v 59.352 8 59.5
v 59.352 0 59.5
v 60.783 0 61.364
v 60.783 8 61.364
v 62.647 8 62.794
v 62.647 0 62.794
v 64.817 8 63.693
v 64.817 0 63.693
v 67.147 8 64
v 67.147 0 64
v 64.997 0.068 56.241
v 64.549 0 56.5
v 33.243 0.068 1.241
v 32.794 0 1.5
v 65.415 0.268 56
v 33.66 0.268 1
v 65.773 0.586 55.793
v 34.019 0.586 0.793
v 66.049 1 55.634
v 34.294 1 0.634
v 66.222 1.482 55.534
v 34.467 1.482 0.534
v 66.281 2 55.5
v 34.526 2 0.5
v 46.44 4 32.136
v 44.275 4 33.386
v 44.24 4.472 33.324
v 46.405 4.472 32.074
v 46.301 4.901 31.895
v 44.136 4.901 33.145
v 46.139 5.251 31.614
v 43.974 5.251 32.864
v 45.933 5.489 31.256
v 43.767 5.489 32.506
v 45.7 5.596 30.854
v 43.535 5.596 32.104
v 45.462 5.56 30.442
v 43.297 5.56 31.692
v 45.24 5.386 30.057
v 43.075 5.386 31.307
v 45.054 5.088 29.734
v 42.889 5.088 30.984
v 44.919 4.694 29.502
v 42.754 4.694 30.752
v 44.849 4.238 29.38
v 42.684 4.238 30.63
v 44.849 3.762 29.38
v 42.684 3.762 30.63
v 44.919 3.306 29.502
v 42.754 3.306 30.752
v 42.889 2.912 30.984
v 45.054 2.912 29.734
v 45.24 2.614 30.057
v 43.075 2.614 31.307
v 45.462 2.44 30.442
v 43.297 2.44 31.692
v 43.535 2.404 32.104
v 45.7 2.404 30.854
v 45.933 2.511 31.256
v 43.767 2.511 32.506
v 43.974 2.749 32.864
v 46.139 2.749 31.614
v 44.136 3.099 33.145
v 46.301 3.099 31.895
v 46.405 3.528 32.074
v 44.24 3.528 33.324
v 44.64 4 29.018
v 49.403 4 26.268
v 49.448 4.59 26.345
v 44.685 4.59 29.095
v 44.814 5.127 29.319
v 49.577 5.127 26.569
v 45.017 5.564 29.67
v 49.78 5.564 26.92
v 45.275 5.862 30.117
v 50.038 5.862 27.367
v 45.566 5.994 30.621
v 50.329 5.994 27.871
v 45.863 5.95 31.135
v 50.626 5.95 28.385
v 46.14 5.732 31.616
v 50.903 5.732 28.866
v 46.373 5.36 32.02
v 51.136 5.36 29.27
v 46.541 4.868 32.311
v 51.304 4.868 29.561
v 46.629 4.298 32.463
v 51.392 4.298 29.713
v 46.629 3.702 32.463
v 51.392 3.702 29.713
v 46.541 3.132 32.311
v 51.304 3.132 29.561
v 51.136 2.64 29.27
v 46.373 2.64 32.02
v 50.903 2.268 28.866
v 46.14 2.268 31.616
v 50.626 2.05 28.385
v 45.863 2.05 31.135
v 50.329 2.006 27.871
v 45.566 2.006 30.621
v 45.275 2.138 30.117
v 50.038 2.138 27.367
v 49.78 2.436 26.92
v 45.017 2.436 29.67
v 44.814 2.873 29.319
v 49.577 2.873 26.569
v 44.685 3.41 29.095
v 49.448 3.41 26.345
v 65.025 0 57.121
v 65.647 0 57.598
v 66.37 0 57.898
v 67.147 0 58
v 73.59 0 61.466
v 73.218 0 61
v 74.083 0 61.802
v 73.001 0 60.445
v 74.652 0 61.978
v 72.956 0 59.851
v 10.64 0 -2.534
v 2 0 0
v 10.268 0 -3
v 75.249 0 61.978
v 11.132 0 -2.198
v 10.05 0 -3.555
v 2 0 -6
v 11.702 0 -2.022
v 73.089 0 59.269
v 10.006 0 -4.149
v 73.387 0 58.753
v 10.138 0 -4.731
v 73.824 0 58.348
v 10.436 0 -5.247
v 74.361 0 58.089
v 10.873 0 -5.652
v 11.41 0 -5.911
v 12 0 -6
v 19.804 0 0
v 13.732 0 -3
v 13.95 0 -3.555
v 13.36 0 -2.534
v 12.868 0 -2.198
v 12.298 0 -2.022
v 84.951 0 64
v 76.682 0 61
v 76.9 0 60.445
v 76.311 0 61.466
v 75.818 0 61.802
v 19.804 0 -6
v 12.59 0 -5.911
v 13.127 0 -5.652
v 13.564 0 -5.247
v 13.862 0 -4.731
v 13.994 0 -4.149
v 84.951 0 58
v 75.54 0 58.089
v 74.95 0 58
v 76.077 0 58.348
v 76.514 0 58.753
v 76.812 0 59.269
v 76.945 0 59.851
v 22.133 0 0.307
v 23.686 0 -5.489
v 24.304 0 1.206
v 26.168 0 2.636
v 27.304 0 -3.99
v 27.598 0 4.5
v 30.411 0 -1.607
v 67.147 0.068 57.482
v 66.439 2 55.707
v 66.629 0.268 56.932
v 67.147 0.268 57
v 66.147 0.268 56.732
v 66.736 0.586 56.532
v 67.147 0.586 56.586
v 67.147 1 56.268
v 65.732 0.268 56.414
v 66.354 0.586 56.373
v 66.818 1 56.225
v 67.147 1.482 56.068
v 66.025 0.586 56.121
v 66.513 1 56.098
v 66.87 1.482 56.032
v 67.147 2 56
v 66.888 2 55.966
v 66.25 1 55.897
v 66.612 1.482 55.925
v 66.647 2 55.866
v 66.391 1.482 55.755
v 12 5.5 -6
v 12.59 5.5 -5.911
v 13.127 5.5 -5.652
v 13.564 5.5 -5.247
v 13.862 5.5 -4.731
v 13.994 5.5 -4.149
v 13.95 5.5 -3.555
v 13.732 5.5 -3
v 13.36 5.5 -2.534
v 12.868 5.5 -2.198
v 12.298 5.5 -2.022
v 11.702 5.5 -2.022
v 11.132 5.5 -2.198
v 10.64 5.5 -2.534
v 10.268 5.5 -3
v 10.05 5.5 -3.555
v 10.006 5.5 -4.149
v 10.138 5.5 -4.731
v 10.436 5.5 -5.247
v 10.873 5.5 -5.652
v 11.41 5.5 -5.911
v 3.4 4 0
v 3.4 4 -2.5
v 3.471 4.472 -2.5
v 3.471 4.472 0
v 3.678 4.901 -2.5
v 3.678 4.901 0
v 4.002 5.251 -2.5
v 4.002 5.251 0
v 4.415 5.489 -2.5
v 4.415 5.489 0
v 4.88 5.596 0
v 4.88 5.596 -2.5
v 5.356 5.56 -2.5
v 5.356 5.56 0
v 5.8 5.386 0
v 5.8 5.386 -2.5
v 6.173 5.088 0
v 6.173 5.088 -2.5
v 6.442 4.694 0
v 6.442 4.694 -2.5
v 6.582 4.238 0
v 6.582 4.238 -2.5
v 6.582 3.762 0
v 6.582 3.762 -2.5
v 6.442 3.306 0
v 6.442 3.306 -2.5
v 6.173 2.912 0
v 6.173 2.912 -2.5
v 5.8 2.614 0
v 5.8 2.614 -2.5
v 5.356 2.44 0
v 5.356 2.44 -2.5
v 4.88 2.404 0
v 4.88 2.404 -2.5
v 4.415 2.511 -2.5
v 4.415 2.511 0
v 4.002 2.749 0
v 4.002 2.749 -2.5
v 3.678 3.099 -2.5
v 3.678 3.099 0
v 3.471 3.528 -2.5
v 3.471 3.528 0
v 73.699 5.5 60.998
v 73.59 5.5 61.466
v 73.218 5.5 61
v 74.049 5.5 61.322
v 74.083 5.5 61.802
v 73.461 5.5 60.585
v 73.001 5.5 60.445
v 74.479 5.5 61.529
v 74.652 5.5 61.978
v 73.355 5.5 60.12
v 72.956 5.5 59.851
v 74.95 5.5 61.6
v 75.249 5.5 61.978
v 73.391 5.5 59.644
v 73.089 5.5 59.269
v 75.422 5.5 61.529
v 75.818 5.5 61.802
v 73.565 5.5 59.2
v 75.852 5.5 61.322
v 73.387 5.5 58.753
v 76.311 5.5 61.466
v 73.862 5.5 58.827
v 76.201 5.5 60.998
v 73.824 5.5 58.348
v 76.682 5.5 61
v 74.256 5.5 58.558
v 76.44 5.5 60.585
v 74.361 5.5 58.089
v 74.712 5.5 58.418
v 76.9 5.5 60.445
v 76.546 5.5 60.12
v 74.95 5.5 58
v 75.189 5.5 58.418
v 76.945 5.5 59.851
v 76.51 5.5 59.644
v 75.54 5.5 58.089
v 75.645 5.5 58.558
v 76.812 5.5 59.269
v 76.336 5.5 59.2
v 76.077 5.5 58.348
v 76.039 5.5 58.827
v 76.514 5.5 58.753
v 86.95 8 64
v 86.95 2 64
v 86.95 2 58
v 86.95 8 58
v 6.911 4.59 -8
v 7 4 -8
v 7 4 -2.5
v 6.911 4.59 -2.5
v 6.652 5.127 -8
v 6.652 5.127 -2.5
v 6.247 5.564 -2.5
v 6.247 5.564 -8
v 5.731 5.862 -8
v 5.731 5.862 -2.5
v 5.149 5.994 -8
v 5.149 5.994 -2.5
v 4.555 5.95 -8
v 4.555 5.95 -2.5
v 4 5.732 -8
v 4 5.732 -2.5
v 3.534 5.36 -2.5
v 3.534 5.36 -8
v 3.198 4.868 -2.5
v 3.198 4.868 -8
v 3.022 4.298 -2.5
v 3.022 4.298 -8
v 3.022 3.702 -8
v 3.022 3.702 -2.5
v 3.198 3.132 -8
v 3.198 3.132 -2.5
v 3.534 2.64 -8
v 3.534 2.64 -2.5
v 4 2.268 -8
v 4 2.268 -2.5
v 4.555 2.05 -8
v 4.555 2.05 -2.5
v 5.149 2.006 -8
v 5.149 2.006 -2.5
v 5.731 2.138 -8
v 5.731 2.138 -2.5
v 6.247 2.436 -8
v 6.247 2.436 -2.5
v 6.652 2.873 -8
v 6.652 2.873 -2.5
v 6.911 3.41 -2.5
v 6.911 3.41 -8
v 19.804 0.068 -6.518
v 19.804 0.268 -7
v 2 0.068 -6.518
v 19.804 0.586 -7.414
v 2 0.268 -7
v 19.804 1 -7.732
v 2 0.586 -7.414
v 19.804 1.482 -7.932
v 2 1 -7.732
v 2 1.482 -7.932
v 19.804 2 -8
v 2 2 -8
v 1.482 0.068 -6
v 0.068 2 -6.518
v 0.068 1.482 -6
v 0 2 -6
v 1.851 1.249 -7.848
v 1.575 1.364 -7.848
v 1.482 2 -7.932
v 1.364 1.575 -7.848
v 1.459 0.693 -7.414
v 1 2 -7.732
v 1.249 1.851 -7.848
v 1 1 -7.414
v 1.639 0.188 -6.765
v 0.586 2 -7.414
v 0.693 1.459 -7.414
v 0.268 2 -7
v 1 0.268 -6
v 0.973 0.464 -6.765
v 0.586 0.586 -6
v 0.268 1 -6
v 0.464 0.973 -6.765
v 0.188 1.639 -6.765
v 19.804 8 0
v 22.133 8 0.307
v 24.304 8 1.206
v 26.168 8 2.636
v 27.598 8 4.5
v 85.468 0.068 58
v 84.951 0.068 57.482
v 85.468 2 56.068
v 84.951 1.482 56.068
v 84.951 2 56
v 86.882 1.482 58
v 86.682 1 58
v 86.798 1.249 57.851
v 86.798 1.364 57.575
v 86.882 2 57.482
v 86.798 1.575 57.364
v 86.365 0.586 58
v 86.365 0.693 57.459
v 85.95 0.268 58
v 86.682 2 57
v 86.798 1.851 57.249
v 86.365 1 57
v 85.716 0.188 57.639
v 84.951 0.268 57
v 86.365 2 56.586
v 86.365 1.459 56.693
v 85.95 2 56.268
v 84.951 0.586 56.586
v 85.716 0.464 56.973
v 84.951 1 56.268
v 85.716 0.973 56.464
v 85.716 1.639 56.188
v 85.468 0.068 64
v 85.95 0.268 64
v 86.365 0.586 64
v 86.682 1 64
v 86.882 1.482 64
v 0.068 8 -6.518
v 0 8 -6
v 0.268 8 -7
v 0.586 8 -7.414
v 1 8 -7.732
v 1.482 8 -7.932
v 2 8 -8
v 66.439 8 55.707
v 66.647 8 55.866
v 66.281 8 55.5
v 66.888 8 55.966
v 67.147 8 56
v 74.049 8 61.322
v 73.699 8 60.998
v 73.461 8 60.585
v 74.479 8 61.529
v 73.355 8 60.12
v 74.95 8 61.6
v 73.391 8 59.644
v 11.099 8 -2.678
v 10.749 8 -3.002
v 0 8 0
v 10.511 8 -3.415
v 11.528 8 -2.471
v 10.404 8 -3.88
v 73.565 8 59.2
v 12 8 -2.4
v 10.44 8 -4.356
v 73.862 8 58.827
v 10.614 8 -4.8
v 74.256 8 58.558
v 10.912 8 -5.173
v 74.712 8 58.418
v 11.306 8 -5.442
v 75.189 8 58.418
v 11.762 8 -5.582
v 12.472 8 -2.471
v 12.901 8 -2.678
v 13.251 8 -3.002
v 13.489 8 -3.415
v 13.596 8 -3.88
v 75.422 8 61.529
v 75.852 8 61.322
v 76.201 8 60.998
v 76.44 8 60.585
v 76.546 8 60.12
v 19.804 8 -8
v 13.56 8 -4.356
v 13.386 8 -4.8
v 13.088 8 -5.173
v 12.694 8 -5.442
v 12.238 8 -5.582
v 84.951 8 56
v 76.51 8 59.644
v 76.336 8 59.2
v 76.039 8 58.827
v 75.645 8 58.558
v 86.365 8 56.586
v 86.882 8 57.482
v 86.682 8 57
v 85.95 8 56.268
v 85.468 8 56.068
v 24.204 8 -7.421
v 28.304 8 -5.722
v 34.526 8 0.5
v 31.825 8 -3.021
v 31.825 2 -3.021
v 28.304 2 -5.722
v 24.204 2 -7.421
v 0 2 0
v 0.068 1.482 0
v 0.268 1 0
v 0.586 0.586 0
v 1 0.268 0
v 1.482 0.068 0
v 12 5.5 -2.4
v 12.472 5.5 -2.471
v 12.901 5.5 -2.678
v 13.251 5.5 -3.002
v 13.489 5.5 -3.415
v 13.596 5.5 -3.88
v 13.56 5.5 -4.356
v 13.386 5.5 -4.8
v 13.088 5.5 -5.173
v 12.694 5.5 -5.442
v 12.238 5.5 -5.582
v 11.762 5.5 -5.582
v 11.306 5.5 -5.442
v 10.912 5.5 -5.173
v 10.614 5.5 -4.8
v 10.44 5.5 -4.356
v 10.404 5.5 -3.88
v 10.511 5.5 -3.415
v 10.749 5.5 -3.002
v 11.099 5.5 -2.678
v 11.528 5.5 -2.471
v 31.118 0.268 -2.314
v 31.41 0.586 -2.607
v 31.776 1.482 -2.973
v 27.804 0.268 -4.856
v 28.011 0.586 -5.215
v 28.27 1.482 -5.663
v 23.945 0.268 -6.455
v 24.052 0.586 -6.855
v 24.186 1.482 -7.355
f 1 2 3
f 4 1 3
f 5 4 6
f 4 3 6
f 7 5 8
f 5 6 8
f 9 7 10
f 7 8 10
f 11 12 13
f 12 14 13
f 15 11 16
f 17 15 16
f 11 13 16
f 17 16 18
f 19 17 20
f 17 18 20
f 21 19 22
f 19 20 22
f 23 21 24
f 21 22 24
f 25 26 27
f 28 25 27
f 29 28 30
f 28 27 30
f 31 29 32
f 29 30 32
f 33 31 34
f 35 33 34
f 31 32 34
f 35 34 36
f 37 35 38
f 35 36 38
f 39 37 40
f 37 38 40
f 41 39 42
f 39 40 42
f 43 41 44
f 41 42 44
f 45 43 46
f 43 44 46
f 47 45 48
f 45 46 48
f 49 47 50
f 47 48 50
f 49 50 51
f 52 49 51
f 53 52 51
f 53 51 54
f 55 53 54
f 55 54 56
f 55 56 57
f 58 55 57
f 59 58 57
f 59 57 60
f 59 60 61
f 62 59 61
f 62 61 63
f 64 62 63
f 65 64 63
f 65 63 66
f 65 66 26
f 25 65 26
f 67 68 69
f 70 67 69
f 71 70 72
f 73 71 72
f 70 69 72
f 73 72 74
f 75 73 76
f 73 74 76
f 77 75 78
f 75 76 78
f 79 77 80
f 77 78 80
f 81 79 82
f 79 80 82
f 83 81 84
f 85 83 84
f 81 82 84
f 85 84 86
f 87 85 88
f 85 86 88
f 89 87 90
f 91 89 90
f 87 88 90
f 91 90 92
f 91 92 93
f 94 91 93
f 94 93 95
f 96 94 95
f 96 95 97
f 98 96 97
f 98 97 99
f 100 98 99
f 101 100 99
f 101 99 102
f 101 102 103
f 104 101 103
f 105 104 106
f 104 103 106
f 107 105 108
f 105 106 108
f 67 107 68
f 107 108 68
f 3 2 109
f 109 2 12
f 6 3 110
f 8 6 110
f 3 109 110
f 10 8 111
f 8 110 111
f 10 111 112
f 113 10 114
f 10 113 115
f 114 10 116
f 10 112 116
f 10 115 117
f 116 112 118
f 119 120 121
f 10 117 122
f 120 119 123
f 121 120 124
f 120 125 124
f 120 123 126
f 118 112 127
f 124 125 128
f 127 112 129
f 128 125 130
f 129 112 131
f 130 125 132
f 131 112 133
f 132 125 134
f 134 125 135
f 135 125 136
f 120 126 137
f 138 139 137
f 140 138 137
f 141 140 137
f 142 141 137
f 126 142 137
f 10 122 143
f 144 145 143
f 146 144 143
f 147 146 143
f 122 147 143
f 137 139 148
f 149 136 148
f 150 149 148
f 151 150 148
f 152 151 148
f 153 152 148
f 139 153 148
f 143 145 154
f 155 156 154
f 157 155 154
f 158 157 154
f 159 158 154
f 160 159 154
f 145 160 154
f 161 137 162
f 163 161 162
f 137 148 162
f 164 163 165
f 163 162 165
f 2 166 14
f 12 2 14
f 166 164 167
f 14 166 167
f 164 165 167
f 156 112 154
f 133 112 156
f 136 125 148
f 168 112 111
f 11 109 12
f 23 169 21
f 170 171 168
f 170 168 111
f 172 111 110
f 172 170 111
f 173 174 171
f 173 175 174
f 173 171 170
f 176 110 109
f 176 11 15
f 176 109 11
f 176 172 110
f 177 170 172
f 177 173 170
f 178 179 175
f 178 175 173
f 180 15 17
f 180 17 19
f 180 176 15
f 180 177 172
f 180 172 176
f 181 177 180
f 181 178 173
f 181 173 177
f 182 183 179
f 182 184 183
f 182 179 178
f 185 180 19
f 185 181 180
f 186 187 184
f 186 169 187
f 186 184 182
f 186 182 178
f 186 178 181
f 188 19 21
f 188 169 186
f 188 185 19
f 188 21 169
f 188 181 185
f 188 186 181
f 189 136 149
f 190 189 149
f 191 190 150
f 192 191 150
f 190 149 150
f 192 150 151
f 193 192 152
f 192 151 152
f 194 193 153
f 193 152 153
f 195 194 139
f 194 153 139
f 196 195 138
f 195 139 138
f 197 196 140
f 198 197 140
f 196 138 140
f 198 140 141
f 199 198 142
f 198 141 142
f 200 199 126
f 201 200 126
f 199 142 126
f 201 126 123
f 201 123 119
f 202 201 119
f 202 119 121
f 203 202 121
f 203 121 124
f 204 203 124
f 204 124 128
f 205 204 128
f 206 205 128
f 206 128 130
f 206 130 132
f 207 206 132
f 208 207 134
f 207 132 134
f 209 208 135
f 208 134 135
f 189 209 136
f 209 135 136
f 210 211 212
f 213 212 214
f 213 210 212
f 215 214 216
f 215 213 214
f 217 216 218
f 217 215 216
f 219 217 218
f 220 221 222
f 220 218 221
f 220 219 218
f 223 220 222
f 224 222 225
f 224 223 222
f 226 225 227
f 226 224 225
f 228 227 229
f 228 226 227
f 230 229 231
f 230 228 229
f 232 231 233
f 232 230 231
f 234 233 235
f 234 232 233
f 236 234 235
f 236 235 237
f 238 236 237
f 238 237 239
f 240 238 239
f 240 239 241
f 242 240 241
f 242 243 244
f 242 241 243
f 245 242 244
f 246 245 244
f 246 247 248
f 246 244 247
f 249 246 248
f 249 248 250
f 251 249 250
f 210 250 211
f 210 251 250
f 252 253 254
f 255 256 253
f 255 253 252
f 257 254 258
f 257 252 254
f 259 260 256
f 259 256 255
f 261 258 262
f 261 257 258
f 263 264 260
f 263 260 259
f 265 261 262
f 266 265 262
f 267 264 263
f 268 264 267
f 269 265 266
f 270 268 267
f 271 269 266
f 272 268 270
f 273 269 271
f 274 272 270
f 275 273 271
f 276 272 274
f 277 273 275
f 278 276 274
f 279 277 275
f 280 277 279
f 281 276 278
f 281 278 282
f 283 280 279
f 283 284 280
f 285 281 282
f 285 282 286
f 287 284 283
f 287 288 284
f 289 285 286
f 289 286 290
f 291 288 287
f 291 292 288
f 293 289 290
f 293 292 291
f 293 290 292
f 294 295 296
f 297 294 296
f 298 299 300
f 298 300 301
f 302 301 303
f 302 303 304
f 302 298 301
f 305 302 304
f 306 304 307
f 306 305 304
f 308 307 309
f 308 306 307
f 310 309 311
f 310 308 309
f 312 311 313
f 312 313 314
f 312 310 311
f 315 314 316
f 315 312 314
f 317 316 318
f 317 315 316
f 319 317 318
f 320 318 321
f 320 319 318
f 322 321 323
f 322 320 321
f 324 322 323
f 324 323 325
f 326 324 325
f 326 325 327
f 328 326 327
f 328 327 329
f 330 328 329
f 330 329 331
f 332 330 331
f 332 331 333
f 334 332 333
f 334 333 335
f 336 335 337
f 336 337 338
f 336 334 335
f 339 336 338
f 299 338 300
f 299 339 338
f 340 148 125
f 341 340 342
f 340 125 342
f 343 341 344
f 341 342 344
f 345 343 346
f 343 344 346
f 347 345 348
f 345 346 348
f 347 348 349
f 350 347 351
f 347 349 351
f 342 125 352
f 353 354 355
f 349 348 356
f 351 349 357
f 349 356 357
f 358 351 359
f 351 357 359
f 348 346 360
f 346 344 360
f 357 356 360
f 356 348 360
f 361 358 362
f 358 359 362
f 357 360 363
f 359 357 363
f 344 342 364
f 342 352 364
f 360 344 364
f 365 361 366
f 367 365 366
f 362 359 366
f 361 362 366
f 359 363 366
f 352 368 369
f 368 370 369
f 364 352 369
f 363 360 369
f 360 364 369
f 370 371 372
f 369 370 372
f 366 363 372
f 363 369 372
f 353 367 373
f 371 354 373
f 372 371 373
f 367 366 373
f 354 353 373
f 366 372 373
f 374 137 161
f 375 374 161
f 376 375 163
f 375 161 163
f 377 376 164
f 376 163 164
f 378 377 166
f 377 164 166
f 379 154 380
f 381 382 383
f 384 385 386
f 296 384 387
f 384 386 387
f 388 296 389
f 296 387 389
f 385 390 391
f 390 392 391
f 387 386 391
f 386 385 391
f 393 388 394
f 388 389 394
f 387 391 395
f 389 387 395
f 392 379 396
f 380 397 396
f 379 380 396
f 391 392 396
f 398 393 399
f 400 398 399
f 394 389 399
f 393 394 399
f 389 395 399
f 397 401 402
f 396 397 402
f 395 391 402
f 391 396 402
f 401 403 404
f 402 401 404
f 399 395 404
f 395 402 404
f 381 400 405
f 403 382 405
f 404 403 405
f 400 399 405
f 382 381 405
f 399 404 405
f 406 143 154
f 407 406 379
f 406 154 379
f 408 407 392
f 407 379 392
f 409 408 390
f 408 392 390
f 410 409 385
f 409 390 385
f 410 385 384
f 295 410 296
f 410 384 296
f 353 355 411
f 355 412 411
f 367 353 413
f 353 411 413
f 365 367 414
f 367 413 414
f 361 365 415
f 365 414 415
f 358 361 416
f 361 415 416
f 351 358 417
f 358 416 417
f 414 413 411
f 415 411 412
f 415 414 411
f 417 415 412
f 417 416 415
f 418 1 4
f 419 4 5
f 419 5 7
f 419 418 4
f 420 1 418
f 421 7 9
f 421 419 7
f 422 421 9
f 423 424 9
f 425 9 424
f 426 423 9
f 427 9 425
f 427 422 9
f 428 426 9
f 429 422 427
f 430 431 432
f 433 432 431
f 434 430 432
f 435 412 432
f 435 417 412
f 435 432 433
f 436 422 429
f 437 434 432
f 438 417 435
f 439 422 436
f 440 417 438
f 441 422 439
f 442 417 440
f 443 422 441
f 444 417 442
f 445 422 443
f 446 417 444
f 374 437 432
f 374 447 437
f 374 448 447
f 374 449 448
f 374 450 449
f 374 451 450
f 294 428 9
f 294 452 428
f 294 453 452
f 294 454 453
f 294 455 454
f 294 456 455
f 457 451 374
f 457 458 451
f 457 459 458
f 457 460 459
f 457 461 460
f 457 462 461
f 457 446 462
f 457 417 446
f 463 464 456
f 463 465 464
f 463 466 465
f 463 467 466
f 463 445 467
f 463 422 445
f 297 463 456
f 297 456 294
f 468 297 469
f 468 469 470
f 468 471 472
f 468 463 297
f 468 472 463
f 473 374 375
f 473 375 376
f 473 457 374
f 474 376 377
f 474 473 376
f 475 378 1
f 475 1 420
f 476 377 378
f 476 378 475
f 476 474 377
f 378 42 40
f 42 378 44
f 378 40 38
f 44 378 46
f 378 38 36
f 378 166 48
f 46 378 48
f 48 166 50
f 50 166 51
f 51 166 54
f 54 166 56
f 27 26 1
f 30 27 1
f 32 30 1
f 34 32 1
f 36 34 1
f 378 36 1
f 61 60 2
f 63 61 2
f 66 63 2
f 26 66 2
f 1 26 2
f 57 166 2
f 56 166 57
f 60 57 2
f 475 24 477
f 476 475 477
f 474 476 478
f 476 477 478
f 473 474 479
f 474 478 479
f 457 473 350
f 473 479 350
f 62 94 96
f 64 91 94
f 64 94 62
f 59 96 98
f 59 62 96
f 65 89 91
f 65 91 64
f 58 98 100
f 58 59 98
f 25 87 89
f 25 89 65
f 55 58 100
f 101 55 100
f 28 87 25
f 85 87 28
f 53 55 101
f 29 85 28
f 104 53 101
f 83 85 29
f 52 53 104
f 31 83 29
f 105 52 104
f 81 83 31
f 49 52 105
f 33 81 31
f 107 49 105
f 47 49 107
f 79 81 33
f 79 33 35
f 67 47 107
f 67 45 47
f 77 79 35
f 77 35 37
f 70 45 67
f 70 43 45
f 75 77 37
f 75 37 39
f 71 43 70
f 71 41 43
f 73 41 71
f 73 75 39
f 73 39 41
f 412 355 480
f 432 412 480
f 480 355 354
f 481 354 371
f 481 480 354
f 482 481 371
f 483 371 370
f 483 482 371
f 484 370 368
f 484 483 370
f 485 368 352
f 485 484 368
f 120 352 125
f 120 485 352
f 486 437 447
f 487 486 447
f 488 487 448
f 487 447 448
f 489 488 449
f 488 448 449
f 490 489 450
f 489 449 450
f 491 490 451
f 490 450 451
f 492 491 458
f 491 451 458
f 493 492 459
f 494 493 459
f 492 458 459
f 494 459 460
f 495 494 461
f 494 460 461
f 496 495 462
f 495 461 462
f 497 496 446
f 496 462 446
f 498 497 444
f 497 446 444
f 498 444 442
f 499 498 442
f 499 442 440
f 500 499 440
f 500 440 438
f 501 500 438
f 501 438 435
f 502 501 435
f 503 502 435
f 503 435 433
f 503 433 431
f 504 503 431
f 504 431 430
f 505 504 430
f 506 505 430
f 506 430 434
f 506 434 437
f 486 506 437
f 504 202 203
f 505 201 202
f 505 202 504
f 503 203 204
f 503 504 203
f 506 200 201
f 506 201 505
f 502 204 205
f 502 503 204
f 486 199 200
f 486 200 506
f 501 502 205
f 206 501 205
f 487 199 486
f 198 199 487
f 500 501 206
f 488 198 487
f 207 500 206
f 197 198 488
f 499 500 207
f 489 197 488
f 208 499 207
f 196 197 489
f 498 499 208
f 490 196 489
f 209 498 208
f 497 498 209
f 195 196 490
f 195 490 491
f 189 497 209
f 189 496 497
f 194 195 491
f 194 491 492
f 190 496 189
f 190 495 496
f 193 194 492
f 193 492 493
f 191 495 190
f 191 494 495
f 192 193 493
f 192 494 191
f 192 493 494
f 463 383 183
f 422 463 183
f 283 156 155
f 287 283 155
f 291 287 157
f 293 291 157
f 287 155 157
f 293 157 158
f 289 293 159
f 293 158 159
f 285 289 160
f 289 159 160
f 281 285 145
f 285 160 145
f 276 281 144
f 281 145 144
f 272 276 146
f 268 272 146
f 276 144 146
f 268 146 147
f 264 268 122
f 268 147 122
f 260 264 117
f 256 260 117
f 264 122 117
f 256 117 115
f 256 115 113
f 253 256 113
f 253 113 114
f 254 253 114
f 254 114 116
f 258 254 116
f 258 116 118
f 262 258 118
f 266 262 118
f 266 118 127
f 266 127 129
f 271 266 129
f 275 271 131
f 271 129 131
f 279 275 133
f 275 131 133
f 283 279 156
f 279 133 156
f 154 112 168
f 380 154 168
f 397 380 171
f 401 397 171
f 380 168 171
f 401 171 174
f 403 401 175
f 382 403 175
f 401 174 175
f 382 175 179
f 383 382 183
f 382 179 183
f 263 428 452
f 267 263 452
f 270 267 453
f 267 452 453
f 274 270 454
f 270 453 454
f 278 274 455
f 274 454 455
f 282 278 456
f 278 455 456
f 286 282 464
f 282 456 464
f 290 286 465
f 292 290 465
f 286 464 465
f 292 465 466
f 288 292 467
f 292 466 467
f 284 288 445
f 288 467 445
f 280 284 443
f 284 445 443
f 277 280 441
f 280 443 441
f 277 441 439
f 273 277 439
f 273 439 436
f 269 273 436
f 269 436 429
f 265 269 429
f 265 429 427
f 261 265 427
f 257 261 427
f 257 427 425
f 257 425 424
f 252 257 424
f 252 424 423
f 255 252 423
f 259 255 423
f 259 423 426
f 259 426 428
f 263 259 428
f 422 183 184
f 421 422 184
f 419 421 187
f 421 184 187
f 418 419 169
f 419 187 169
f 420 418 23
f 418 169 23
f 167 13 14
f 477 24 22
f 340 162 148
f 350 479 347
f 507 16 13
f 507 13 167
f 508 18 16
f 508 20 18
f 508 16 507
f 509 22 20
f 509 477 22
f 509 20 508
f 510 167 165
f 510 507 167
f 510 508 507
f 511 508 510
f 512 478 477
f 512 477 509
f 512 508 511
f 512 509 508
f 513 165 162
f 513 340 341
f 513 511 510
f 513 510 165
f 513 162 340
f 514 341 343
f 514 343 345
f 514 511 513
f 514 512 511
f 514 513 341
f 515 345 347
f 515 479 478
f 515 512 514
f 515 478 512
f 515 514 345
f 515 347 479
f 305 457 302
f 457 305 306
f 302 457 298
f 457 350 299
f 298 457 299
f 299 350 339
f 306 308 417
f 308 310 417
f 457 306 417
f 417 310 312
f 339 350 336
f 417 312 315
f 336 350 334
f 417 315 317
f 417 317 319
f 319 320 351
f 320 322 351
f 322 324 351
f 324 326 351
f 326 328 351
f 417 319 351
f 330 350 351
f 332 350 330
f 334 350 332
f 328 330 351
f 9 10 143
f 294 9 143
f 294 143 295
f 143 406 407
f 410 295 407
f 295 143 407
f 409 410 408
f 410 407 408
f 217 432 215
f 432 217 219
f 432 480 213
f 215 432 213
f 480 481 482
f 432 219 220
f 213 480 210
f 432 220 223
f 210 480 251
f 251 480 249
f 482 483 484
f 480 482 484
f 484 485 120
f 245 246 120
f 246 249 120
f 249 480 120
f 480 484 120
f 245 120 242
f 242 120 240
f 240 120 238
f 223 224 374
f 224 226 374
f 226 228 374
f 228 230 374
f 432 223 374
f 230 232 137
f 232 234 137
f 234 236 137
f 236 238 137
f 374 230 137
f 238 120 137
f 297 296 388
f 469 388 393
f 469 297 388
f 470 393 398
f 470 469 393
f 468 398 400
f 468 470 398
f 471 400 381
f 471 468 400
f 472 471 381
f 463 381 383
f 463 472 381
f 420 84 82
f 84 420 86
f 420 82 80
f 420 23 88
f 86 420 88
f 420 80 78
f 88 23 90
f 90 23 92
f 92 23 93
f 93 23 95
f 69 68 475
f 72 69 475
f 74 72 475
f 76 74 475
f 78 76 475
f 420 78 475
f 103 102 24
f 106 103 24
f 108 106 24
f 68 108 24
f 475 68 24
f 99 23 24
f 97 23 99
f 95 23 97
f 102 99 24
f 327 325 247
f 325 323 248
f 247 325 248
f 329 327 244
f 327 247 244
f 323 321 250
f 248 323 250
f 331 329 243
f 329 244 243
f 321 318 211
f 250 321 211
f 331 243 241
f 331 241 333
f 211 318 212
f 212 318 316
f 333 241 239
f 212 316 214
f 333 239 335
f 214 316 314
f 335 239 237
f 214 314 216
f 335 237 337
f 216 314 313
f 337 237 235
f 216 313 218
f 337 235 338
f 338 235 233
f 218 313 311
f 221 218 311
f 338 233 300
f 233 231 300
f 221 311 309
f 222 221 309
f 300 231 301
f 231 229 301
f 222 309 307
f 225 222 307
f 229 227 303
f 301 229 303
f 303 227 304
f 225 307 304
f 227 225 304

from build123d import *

# Parameters (mm, degrees)
EXTRU_MINCE1_DEPTH      = 8
ESQUISSE2_R             = 1.6
ENL_V_MAT_EXTRU_1_DEPTH = 109.260681026
ESQUISSE3_R             = 2
ENL_V_MAT_EXTRU_2_DEPTH = 5.5
ESQUISSE4_R             = 1.6
ENL_V_MAT_EXTRU_3_DEPTH = 109.260681026
ESQUISSE5_R             = 2
ENL_V_MAT_EXTRU_4_DEPTH = 5.5
ESQUISSE7_R             = 1.6
ENL_V_MAT_EXTRU_5_DEPTH = 102.558480966
ESQUISSE8_R             = 2
ENL_V_MAT_EXTRU_6_DEPTH = 5.5
CONG_1_R                = 2


with BuildPart() as part:
    # Esquisse1 → Extru.-Mince1 (new body)
    with BuildSketch(Plane(origin=(0, 0, 0), x_dir=(1, 0, 0), z_dir=(0, 1, 0))):
        with BuildLine():
            Line((0, 0), (19.803847577, 0))
            ThreePointArc((19.803847577, 0), (24.303847577, -1.205771366), (27.598076211, -4.5))
            Line((27.598076211, -4.5), (59.352341017, -59.5))
            ThreePointArc((59.352341017, -59.5), (62.646569651, -62.794228634), (67.146569651, -64))
            Line((67.146569651, -64), (86.950417228, -64))
            Line((86.950417228, -64), (86.950417228, -56))
            Line((86.950417228, -56), (67.146569651, -56))
            ThreePointArc((67.146569651, -56), (66.646569651, -55.866025404), (66.280544247, -55.5))
            Line((66.280544247, -55.5), (34.526279442, -0.5))
            ThreePointArc((34.526279442, -0.5), (28.303847577, 5.722431864), (19.803847577, 8))
            Line((19.803847577, 8), (0, 8))
            Line((0, 8), (0, 0))
        make_face()
    extrude(amount=EXTRU_MINCE1_DEPTH)

    # Esquisse2 → Enlèv. mat.-Extru.1 (cut, through all)
    with BuildSketch(Plane(origin=(0, 8, 0), x_dir=(1, 0, 0), z_dir=(0, 1, 0))):
        with Locations(Location((74.950417228, -60, 0), (0, 0, 270))):
            Circle(ESQUISSE2_R)
        with Locations(Location((12, 4, 0), (0, 0, 270))):
            Circle(ESQUISSE2_R)
    extrude(amount=-ENL_V_MAT_EXTRU_1_DEPTH, mode=Mode.SUBTRACT)

    # Esquisse3 → Enlèv. mat.-Extru.2 (cut)
    with BuildSketch(Plane.XZ):
        with Locations(Location((74.950417228, 60, 0), (0, 0, 270))):
            Circle(ESQUISSE3_R)
        with Locations(Location((12, -4, 0), (0, 0, 270))):
            Circle(ESQUISSE3_R)
    extrude(amount=-ENL_V_MAT_EXTRU_2_DEPTH, mode=Mode.SUBTRACT)

    # Esquisse4 → Enlèv. mat.-Extru.3 (cut, through all)
    with BuildSketch(Plane(origin=(0, 0, 0), x_dir=(-1, 0, 0), z_dir=(0, 0, -1))):
        with Locations((-5, 4)):
            Circle(ESQUISSE4_R)
    extrude(amount=ENL_V_MAT_EXTRU_3_DEPTH, mode=Mode.SUBTRACT)

    # Esquisse5 → Enlèv. mat.-Extru.4 (cut)
    with BuildSketch(Plane.XY.offset(-8)):
        with Locations((5, 4)):
            Circle(ESQUISSE5_R)
    extrude(amount=ENL_V_MAT_EXTRU_4_DEPTH, mode=Mode.SUBTRACT)

    # Esquisse7 → Enlèv. mat.-Extru.5 (cut, through all)
    with BuildSketch(Plane(origin=(18.75, 0, -10.825317547), x_dir=(0.499999999999998, 0, 0.8660254037844398), z_dir=(-0.8660254037844399, 0, 0.49999999999999806))):
        with Locations((49.450417228, 4)):
            Circle(ESQUISSE7_R)
    extrude(amount=-ENL_V_MAT_EXTRU_5_DEPTH, mode=Mode.SUBTRACT)

    # Esquisse8 → Enlèv. mat.-Extru.6 (cut)
    with BuildSketch(Plane(origin=(25.67820323, 0, -14.825317547), x_dir=(-0.49999999999999806, 0, -0.8660254037844398), z_dir=(0.8660254037844397, 0, -0.499999999999998))):
        with Locations((-49.450417228, 4)):
            Circle(ESQUISSE8_R)
    extrude(amount=-ENL_V_MAT_EXTRU_6_DEPTH, mode=Mode.SUBTRACT)

    # Congé1
    cong_1_edges = [part.edges().sort_by_distance(p)[0] for p in [
        (0, 0, -4),
        (9.901923789, 0, -8),
        (28.303847577, 0, -5.722431864),
        (50.403411844, 0, 28),
        (66.646569651, 0, 55.866025404),
        (77.048493439, 0, 56),
        (86.950417228, 0, 60),
        (0, 4, -8),
        (86.950417228, 4, 56),
    ]]
    fillet(cong_1_edges, radius=CONG_1_R - 0.0001)  # a hair under: the kernel refuses the full size


solid = part.part
